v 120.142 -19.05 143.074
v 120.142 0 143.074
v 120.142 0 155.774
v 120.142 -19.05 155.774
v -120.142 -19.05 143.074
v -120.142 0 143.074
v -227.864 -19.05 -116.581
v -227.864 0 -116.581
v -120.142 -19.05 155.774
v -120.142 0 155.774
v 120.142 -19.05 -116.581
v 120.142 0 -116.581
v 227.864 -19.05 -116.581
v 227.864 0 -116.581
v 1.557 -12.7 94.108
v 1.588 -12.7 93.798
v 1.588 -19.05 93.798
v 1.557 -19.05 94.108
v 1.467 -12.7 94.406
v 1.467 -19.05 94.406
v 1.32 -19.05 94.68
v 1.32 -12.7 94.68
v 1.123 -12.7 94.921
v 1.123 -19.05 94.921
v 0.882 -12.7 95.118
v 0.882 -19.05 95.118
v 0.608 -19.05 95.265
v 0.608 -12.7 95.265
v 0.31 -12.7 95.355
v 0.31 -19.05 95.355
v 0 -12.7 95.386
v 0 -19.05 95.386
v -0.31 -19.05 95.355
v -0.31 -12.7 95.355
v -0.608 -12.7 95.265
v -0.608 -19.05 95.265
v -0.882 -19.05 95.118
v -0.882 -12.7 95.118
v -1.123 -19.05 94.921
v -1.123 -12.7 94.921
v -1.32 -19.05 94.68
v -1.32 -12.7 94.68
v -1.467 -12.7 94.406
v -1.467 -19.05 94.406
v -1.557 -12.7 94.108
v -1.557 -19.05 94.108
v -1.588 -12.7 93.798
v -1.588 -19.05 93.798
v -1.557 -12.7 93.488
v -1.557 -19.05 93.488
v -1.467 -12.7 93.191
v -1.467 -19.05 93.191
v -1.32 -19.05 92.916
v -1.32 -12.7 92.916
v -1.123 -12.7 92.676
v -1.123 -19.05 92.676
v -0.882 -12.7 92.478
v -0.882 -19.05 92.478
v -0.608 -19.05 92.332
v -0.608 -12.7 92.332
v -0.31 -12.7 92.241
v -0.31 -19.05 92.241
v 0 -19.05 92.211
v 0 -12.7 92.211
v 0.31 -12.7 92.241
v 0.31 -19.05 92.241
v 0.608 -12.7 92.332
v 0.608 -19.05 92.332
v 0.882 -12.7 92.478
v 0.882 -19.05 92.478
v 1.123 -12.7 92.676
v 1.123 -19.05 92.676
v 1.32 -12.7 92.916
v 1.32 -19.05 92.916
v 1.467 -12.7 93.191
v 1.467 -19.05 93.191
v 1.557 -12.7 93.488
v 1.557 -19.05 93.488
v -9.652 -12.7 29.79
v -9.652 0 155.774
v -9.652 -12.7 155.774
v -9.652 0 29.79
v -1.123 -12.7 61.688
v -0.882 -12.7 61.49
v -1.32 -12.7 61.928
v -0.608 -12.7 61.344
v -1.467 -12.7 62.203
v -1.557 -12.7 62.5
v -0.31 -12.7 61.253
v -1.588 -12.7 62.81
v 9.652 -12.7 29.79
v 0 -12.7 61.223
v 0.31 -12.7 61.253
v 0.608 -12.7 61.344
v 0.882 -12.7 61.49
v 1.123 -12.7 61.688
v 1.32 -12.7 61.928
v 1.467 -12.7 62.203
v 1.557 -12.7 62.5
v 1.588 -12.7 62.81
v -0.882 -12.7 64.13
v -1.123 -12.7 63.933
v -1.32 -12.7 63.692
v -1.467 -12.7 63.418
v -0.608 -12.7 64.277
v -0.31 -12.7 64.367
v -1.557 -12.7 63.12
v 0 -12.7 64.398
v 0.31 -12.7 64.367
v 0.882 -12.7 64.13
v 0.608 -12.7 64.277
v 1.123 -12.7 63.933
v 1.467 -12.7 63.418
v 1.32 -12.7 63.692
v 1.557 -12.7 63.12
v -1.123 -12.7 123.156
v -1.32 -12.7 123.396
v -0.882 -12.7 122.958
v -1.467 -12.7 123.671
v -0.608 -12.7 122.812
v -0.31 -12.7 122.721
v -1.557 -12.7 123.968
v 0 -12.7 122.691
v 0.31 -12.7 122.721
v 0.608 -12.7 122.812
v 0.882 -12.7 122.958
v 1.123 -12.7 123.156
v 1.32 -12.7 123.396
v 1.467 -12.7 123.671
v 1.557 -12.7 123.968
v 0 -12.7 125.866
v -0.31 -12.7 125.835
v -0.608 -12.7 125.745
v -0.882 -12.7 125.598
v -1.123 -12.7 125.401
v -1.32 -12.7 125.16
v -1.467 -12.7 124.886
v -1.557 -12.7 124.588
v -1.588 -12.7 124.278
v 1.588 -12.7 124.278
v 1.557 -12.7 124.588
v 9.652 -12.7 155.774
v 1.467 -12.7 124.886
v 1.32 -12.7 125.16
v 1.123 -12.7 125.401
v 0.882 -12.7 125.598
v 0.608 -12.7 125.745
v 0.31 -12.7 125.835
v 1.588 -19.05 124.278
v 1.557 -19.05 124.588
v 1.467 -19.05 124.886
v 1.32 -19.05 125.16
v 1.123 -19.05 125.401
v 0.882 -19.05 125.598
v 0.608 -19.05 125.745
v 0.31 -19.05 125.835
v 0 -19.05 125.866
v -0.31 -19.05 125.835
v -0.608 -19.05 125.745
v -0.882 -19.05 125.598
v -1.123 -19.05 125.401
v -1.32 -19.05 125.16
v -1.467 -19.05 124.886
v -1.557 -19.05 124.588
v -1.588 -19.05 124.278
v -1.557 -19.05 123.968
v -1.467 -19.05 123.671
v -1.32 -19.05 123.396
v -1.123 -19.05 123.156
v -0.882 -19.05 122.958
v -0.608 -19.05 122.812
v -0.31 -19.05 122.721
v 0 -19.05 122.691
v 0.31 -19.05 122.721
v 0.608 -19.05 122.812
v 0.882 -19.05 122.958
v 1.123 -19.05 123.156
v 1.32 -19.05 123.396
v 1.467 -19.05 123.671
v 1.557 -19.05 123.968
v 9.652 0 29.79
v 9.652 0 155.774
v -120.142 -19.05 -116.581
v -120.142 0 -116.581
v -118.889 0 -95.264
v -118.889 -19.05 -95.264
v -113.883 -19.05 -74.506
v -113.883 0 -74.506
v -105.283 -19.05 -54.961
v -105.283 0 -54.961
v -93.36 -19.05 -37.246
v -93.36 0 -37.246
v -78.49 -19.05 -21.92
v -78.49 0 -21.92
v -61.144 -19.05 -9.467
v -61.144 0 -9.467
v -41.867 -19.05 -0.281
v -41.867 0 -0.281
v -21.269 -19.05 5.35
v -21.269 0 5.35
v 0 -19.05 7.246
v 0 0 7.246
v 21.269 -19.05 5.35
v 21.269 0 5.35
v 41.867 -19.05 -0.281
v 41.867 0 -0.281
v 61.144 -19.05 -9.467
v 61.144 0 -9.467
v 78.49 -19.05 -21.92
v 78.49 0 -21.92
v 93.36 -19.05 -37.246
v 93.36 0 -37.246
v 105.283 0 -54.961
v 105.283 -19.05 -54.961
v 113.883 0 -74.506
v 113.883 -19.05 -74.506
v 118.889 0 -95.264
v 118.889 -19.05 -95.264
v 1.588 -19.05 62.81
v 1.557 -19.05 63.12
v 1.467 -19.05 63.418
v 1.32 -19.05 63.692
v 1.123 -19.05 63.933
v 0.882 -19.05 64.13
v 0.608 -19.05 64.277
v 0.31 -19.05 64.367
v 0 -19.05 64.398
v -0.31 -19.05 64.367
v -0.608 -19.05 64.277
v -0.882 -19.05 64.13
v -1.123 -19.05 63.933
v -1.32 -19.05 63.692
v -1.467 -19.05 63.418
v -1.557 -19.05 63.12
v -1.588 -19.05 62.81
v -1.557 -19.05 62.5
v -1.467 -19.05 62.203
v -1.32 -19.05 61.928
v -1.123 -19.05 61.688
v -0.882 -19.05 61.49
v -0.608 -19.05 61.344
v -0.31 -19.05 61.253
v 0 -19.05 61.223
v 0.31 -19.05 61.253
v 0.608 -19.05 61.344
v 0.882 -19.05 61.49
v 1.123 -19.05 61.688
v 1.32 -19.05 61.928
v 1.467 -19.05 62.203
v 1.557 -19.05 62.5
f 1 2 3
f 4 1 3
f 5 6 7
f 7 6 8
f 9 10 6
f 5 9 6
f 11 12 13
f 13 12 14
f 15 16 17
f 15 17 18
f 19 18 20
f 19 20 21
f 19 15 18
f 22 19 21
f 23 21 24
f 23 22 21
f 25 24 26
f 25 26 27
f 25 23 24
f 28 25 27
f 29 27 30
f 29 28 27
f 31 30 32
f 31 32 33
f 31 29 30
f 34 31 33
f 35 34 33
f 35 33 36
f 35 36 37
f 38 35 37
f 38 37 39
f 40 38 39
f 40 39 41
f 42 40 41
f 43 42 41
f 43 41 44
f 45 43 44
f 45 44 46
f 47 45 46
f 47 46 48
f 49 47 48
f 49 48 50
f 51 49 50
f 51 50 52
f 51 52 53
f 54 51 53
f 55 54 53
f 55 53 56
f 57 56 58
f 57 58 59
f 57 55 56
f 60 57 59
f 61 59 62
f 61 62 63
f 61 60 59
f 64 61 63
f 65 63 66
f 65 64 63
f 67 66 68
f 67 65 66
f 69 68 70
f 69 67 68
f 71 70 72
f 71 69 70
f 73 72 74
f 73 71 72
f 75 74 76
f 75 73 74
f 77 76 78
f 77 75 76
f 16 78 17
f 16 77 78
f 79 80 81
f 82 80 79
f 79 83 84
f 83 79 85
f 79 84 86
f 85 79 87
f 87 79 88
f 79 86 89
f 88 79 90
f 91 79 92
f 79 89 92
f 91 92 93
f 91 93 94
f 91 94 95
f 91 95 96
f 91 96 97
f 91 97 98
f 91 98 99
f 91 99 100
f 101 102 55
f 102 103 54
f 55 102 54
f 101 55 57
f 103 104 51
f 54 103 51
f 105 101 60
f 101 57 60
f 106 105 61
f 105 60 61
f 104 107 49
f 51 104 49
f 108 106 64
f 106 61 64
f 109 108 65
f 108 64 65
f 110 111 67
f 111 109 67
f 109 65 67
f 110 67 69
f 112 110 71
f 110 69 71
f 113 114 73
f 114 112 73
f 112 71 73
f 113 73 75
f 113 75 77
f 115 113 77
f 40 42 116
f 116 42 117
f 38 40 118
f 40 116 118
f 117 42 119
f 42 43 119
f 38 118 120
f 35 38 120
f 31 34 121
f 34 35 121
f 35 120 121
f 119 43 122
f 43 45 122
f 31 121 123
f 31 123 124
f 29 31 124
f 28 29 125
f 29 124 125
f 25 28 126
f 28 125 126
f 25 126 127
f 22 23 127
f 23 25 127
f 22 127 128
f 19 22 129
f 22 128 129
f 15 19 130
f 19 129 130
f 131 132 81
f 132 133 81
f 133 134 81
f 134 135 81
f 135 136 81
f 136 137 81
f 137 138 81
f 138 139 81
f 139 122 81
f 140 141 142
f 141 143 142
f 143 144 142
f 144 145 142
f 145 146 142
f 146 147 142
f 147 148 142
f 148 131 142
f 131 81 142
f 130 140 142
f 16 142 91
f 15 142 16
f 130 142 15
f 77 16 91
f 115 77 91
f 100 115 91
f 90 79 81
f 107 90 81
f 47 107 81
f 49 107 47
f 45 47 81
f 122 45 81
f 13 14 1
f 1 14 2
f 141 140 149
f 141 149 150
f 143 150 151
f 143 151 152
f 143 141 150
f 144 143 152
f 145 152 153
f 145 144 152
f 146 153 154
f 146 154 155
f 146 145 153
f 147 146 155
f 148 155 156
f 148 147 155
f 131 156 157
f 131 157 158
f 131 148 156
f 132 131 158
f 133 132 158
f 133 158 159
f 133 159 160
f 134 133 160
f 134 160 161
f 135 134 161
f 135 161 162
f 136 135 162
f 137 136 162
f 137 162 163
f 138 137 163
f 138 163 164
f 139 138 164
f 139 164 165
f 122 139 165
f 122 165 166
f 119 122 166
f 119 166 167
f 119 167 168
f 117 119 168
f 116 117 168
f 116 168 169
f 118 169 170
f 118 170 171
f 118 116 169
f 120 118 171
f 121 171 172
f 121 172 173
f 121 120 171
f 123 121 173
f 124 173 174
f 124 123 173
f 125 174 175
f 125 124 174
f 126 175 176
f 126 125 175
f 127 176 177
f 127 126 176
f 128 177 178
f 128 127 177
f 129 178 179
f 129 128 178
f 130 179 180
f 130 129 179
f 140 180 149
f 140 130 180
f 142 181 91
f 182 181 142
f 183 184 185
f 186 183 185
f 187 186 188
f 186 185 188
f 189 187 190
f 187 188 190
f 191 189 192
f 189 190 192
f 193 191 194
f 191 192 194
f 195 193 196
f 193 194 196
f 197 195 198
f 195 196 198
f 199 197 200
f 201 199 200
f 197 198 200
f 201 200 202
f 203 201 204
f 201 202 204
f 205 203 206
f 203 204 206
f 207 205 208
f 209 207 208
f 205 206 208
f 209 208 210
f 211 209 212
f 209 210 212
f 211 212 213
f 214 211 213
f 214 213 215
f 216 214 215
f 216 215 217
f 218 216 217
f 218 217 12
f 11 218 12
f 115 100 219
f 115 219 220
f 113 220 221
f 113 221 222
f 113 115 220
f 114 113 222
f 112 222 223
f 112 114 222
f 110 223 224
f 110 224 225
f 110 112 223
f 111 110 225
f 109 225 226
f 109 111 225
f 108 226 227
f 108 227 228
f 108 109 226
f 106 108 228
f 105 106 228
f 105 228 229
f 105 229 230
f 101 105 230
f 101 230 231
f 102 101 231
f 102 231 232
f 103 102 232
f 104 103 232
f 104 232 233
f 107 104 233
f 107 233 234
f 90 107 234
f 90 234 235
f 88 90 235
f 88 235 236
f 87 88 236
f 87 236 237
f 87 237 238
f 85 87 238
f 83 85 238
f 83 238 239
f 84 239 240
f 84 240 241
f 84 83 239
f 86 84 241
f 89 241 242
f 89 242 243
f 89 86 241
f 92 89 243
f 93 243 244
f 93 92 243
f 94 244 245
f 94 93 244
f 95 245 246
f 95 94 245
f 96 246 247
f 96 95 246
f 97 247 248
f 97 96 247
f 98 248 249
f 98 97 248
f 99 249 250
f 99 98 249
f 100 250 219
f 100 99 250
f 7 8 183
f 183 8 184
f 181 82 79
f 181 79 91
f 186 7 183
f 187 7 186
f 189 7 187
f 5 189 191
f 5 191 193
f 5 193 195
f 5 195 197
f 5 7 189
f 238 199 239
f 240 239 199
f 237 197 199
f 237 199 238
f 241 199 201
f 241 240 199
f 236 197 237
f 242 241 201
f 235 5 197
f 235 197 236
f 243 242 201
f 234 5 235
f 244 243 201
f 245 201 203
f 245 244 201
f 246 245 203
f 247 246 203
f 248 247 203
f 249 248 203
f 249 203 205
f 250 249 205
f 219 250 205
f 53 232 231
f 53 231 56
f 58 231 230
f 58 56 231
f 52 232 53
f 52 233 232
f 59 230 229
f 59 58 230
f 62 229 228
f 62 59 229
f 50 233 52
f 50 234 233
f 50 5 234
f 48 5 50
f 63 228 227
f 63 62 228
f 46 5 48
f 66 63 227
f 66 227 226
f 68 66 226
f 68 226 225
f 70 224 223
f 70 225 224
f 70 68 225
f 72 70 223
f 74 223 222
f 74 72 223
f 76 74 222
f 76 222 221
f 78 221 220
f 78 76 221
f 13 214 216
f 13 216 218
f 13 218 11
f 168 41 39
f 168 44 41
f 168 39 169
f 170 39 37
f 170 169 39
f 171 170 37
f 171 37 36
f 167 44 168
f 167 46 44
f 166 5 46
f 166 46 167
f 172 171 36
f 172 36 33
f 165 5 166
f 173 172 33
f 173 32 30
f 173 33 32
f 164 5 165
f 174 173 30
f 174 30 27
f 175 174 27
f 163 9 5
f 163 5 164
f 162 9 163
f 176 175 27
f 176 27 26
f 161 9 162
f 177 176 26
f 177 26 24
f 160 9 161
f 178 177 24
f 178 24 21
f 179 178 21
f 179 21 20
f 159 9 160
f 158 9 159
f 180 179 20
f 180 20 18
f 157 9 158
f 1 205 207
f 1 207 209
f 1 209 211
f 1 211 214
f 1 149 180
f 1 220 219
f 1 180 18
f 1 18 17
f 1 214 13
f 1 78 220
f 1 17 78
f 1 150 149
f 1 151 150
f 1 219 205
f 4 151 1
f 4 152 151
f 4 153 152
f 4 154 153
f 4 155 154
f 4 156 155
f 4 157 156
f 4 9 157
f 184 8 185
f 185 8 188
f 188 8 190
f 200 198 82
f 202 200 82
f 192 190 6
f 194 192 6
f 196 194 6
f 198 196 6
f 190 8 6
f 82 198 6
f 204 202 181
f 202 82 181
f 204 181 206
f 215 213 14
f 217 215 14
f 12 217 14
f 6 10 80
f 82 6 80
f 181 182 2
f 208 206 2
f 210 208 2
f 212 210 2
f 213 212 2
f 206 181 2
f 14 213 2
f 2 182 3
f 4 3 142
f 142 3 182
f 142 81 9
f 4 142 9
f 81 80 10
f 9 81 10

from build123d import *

# Parameters (mm, degrees)
F1_DEPTH = 19.05
F2_R     = 1.5875
F3_DEPTH = 12.7
F4_DEPTH = 19.05
F5_DEPTH = 19.05
F6_DEPTH = 19.05


with BuildPart() as f1:
    # F0 (on Front) → F1 (new body)
    with BuildSketch(Plane.XZ):
        with BuildLine():
            Line((120.142, 155.7741917981), (0, 155.7741917981))
            Line((0, 155.7741917981), (-120.142, 155.7741917981))
            Line((-120.142, 155.7741917981), (-120.142, 143.0741917981))
            Line((-120.142, 143.0741917981), (-227.8642566605, -116.5812388062))
            Line((-227.8642566605, -116.5812388062), (-120.142, -116.5812388062))
            ThreePointArc((-120.142, -116.5812388062), (0, 7.246479044), (120.142, -116.5812388062))
            Line((120.142, -116.5812388062), (227.8642566605, -116.5812388062))
            Line((227.8642566605, -116.5812388062), (120.142, 143.0741917981))
            Line((120.142, 143.0741917981), (120.142, 155.7741917981))
        make_face()
    extrude(amount=F1_DEPTH)

    # F2 (on Front) → F3 (cut)
    with BuildSketch(Plane.XZ):
        Polygon((-9.652, 29.7901917981), (0, 29.7901917981), (9.652, 29.7901917981), (9.652, 155.7741917981), (0, 155.7741917981), (-9.652, 155.7741917981), align=None)
        with Locations((0, 62.8101917981)):
            Circle(F2_R, mode=Mode.SUBTRACT)
        with Locations((0, 93.7981917981)):
            Circle(F2_R, mode=Mode.SUBTRACT)
        with Locations((0, 124.2781917981)):
            Circle(F2_R, mode=Mode.SUBTRACT)
    extrude(amount=F3_DEPTH, mode=Mode.SUBTRACT)

    # F4 (cut): a face of the model
    f4_faces = [f1.faces().sort_by_distance(p)[0] for p in [
        (0, 0, 124.2781917981),
    ]]
    extrude(f4_faces, amount=-F4_DEPTH, mode=Mode.SUBTRACT)

    # F5 (cut): a face of the model
    f5_faces = [f1.faces().sort_by_distance(p)[0] for p in [
        (0, 0, 93.7981917981),
    ]]
    extrude(f5_faces, amount=-F5_DEPTH, mode=Mode.SUBTRACT)

    # F6 (cut): a face of the model
    f6_faces = [f1.faces().sort_by_distance(p)[0] for p in [
        (0, 0, 62.8101917981),
    ]]
    extrude(f6_faces, amount=-F6_DEPTH, mode=Mode.SUBTRACT)


solid = f1.part
